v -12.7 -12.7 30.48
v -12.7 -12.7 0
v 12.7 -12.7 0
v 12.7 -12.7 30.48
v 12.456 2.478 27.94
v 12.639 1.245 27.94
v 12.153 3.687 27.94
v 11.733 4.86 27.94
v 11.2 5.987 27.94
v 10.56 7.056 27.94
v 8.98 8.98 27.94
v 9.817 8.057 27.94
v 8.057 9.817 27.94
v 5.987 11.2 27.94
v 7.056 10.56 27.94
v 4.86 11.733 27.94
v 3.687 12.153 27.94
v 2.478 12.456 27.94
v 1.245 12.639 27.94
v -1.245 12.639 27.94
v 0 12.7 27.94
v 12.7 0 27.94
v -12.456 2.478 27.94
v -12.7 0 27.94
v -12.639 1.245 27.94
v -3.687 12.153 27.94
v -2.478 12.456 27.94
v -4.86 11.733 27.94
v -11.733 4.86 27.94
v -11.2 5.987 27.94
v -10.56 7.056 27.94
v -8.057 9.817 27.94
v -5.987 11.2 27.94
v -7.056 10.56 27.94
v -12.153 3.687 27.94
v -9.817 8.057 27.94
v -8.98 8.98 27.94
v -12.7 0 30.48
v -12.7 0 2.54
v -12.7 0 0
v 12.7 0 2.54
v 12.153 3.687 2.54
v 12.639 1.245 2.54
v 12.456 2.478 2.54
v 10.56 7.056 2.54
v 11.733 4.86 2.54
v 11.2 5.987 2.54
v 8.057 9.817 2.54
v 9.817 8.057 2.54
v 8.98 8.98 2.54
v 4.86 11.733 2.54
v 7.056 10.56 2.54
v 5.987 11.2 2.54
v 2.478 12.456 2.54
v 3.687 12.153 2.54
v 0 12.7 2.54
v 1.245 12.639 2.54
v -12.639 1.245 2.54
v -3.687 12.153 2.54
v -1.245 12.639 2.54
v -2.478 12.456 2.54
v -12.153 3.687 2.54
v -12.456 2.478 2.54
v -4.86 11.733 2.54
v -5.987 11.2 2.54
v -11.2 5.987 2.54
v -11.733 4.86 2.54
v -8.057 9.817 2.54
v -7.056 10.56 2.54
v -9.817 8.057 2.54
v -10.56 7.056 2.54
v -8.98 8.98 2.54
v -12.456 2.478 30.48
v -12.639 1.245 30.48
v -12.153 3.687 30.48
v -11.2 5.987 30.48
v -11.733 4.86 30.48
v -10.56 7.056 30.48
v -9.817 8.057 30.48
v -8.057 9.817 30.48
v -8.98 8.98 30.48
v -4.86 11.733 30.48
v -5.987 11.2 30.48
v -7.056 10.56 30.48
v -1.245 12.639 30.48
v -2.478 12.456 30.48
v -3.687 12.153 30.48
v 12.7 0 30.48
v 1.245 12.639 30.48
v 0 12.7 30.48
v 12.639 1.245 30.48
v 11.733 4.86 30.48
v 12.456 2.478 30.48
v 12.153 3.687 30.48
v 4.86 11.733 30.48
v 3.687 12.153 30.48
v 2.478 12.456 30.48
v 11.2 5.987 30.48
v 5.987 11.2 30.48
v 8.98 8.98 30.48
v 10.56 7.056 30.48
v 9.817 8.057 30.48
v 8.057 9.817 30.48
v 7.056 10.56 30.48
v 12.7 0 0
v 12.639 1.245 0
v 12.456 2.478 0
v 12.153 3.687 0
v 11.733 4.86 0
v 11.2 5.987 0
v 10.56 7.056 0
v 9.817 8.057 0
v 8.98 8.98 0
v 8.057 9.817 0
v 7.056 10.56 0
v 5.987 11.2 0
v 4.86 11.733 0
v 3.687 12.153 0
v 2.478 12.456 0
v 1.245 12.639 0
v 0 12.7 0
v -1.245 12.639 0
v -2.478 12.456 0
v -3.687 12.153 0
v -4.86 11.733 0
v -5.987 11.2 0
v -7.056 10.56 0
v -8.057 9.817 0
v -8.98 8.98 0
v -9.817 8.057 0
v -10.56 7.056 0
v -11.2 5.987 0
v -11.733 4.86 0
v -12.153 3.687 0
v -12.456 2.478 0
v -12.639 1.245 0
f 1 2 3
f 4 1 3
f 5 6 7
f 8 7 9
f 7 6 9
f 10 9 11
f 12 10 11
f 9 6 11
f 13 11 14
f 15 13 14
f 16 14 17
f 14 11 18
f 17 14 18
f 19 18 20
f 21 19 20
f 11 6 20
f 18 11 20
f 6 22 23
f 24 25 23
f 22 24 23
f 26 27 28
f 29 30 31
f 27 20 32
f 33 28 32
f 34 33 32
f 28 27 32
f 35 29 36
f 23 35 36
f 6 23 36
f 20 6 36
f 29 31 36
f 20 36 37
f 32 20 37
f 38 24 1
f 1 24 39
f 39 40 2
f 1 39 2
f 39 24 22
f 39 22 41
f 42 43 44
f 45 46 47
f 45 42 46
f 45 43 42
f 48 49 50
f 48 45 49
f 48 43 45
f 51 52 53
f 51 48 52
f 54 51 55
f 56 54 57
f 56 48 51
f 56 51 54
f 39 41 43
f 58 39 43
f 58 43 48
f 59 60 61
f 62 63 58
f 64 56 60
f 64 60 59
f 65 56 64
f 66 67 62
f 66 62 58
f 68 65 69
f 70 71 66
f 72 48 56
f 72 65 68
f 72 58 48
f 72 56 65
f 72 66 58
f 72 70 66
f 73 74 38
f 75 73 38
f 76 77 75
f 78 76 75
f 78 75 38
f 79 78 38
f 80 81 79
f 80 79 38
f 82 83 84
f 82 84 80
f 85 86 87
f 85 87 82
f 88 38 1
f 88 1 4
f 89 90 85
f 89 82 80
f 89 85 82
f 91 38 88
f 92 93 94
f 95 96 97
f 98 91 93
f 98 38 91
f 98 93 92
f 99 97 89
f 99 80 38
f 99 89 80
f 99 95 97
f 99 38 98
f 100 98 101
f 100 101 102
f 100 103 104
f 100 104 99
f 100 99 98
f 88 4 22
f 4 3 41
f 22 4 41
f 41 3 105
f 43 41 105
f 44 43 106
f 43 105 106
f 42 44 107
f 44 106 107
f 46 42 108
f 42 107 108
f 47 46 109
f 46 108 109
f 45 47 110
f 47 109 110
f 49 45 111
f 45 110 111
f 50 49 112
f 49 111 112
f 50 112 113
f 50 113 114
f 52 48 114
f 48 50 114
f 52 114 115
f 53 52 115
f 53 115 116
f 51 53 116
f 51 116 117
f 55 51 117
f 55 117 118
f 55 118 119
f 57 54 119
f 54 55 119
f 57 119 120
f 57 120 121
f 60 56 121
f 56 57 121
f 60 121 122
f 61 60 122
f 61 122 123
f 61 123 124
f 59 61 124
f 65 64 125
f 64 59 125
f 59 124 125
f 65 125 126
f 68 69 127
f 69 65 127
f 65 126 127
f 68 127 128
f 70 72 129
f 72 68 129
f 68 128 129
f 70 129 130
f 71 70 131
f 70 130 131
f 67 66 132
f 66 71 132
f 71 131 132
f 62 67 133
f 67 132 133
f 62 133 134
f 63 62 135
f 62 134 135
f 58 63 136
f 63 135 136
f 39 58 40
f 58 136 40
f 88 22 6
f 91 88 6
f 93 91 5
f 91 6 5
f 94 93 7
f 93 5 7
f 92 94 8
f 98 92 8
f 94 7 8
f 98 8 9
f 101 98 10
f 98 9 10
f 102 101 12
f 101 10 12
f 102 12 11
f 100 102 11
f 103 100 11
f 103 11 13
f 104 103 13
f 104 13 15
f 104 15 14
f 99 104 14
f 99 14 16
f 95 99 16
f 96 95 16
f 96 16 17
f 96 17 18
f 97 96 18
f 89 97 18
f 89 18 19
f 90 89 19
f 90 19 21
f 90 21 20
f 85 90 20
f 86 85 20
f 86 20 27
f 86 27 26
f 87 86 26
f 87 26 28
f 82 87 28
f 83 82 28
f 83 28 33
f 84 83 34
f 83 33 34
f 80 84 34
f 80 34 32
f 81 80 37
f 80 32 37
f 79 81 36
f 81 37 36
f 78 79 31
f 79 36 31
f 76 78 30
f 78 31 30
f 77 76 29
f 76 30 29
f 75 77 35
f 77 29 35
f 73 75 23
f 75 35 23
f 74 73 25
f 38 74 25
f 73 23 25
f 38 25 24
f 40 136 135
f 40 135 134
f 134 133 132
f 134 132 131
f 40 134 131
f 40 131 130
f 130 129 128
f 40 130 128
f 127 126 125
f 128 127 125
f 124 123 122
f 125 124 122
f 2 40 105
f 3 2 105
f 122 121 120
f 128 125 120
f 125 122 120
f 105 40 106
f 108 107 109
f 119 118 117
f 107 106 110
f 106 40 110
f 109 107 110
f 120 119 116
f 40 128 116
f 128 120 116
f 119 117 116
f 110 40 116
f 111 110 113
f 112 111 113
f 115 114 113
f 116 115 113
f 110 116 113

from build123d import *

# Parameters (mm, degrees)
BOSS_EXTRUDE1_DEPTH     = 30.48
CUT_EXTRUDE1_DEPTH      = 42.659097446
CUT_EXTRUDE1_DEPTH_BACK = 42.659097446
SKETCH3_W               = 25.4
SKETCH3_H               = 12.7


with BuildPart() as part:
    # Sketch2 → Boss-Extrude1 (new body)
    with BuildSketch(Plane.XY):
        with BuildLine():
            Line((-12.7, 0), (-12.7, -12.7))
            Line((-12.7, -12.7), (12.7, -12.7))
            Line((12.7, -12.7), (12.7, 0))
            ThreePointArc((12.7, 0), (0, 12.7), (-12.7, 0))
        make_face()
    extrude(amount=BOSS_EXTRUDE1_DEPTH)

    # Sketch3 → Cut-Extrude1 (cut, two sides: drawn at the far end of the back side and taken through both)
    with BuildSketch(Plane(origin=(12.7, 0, 0), x_dir=(0, 0, -1), z_dir=(1, 0, 0)).offset(-CUT_EXTRUDE1_DEPTH_BACK)):
        with Locations((-15.24, 6.35)):
            Rectangle(SKETCH3_W, SKETCH3_H)
    extrude(amount=CUT_EXTRUDE1_DEPTH + CUT_EXTRUDE1_DEPTH_BACK, mode=Mode.SUBTRACT)


solid = part.part
